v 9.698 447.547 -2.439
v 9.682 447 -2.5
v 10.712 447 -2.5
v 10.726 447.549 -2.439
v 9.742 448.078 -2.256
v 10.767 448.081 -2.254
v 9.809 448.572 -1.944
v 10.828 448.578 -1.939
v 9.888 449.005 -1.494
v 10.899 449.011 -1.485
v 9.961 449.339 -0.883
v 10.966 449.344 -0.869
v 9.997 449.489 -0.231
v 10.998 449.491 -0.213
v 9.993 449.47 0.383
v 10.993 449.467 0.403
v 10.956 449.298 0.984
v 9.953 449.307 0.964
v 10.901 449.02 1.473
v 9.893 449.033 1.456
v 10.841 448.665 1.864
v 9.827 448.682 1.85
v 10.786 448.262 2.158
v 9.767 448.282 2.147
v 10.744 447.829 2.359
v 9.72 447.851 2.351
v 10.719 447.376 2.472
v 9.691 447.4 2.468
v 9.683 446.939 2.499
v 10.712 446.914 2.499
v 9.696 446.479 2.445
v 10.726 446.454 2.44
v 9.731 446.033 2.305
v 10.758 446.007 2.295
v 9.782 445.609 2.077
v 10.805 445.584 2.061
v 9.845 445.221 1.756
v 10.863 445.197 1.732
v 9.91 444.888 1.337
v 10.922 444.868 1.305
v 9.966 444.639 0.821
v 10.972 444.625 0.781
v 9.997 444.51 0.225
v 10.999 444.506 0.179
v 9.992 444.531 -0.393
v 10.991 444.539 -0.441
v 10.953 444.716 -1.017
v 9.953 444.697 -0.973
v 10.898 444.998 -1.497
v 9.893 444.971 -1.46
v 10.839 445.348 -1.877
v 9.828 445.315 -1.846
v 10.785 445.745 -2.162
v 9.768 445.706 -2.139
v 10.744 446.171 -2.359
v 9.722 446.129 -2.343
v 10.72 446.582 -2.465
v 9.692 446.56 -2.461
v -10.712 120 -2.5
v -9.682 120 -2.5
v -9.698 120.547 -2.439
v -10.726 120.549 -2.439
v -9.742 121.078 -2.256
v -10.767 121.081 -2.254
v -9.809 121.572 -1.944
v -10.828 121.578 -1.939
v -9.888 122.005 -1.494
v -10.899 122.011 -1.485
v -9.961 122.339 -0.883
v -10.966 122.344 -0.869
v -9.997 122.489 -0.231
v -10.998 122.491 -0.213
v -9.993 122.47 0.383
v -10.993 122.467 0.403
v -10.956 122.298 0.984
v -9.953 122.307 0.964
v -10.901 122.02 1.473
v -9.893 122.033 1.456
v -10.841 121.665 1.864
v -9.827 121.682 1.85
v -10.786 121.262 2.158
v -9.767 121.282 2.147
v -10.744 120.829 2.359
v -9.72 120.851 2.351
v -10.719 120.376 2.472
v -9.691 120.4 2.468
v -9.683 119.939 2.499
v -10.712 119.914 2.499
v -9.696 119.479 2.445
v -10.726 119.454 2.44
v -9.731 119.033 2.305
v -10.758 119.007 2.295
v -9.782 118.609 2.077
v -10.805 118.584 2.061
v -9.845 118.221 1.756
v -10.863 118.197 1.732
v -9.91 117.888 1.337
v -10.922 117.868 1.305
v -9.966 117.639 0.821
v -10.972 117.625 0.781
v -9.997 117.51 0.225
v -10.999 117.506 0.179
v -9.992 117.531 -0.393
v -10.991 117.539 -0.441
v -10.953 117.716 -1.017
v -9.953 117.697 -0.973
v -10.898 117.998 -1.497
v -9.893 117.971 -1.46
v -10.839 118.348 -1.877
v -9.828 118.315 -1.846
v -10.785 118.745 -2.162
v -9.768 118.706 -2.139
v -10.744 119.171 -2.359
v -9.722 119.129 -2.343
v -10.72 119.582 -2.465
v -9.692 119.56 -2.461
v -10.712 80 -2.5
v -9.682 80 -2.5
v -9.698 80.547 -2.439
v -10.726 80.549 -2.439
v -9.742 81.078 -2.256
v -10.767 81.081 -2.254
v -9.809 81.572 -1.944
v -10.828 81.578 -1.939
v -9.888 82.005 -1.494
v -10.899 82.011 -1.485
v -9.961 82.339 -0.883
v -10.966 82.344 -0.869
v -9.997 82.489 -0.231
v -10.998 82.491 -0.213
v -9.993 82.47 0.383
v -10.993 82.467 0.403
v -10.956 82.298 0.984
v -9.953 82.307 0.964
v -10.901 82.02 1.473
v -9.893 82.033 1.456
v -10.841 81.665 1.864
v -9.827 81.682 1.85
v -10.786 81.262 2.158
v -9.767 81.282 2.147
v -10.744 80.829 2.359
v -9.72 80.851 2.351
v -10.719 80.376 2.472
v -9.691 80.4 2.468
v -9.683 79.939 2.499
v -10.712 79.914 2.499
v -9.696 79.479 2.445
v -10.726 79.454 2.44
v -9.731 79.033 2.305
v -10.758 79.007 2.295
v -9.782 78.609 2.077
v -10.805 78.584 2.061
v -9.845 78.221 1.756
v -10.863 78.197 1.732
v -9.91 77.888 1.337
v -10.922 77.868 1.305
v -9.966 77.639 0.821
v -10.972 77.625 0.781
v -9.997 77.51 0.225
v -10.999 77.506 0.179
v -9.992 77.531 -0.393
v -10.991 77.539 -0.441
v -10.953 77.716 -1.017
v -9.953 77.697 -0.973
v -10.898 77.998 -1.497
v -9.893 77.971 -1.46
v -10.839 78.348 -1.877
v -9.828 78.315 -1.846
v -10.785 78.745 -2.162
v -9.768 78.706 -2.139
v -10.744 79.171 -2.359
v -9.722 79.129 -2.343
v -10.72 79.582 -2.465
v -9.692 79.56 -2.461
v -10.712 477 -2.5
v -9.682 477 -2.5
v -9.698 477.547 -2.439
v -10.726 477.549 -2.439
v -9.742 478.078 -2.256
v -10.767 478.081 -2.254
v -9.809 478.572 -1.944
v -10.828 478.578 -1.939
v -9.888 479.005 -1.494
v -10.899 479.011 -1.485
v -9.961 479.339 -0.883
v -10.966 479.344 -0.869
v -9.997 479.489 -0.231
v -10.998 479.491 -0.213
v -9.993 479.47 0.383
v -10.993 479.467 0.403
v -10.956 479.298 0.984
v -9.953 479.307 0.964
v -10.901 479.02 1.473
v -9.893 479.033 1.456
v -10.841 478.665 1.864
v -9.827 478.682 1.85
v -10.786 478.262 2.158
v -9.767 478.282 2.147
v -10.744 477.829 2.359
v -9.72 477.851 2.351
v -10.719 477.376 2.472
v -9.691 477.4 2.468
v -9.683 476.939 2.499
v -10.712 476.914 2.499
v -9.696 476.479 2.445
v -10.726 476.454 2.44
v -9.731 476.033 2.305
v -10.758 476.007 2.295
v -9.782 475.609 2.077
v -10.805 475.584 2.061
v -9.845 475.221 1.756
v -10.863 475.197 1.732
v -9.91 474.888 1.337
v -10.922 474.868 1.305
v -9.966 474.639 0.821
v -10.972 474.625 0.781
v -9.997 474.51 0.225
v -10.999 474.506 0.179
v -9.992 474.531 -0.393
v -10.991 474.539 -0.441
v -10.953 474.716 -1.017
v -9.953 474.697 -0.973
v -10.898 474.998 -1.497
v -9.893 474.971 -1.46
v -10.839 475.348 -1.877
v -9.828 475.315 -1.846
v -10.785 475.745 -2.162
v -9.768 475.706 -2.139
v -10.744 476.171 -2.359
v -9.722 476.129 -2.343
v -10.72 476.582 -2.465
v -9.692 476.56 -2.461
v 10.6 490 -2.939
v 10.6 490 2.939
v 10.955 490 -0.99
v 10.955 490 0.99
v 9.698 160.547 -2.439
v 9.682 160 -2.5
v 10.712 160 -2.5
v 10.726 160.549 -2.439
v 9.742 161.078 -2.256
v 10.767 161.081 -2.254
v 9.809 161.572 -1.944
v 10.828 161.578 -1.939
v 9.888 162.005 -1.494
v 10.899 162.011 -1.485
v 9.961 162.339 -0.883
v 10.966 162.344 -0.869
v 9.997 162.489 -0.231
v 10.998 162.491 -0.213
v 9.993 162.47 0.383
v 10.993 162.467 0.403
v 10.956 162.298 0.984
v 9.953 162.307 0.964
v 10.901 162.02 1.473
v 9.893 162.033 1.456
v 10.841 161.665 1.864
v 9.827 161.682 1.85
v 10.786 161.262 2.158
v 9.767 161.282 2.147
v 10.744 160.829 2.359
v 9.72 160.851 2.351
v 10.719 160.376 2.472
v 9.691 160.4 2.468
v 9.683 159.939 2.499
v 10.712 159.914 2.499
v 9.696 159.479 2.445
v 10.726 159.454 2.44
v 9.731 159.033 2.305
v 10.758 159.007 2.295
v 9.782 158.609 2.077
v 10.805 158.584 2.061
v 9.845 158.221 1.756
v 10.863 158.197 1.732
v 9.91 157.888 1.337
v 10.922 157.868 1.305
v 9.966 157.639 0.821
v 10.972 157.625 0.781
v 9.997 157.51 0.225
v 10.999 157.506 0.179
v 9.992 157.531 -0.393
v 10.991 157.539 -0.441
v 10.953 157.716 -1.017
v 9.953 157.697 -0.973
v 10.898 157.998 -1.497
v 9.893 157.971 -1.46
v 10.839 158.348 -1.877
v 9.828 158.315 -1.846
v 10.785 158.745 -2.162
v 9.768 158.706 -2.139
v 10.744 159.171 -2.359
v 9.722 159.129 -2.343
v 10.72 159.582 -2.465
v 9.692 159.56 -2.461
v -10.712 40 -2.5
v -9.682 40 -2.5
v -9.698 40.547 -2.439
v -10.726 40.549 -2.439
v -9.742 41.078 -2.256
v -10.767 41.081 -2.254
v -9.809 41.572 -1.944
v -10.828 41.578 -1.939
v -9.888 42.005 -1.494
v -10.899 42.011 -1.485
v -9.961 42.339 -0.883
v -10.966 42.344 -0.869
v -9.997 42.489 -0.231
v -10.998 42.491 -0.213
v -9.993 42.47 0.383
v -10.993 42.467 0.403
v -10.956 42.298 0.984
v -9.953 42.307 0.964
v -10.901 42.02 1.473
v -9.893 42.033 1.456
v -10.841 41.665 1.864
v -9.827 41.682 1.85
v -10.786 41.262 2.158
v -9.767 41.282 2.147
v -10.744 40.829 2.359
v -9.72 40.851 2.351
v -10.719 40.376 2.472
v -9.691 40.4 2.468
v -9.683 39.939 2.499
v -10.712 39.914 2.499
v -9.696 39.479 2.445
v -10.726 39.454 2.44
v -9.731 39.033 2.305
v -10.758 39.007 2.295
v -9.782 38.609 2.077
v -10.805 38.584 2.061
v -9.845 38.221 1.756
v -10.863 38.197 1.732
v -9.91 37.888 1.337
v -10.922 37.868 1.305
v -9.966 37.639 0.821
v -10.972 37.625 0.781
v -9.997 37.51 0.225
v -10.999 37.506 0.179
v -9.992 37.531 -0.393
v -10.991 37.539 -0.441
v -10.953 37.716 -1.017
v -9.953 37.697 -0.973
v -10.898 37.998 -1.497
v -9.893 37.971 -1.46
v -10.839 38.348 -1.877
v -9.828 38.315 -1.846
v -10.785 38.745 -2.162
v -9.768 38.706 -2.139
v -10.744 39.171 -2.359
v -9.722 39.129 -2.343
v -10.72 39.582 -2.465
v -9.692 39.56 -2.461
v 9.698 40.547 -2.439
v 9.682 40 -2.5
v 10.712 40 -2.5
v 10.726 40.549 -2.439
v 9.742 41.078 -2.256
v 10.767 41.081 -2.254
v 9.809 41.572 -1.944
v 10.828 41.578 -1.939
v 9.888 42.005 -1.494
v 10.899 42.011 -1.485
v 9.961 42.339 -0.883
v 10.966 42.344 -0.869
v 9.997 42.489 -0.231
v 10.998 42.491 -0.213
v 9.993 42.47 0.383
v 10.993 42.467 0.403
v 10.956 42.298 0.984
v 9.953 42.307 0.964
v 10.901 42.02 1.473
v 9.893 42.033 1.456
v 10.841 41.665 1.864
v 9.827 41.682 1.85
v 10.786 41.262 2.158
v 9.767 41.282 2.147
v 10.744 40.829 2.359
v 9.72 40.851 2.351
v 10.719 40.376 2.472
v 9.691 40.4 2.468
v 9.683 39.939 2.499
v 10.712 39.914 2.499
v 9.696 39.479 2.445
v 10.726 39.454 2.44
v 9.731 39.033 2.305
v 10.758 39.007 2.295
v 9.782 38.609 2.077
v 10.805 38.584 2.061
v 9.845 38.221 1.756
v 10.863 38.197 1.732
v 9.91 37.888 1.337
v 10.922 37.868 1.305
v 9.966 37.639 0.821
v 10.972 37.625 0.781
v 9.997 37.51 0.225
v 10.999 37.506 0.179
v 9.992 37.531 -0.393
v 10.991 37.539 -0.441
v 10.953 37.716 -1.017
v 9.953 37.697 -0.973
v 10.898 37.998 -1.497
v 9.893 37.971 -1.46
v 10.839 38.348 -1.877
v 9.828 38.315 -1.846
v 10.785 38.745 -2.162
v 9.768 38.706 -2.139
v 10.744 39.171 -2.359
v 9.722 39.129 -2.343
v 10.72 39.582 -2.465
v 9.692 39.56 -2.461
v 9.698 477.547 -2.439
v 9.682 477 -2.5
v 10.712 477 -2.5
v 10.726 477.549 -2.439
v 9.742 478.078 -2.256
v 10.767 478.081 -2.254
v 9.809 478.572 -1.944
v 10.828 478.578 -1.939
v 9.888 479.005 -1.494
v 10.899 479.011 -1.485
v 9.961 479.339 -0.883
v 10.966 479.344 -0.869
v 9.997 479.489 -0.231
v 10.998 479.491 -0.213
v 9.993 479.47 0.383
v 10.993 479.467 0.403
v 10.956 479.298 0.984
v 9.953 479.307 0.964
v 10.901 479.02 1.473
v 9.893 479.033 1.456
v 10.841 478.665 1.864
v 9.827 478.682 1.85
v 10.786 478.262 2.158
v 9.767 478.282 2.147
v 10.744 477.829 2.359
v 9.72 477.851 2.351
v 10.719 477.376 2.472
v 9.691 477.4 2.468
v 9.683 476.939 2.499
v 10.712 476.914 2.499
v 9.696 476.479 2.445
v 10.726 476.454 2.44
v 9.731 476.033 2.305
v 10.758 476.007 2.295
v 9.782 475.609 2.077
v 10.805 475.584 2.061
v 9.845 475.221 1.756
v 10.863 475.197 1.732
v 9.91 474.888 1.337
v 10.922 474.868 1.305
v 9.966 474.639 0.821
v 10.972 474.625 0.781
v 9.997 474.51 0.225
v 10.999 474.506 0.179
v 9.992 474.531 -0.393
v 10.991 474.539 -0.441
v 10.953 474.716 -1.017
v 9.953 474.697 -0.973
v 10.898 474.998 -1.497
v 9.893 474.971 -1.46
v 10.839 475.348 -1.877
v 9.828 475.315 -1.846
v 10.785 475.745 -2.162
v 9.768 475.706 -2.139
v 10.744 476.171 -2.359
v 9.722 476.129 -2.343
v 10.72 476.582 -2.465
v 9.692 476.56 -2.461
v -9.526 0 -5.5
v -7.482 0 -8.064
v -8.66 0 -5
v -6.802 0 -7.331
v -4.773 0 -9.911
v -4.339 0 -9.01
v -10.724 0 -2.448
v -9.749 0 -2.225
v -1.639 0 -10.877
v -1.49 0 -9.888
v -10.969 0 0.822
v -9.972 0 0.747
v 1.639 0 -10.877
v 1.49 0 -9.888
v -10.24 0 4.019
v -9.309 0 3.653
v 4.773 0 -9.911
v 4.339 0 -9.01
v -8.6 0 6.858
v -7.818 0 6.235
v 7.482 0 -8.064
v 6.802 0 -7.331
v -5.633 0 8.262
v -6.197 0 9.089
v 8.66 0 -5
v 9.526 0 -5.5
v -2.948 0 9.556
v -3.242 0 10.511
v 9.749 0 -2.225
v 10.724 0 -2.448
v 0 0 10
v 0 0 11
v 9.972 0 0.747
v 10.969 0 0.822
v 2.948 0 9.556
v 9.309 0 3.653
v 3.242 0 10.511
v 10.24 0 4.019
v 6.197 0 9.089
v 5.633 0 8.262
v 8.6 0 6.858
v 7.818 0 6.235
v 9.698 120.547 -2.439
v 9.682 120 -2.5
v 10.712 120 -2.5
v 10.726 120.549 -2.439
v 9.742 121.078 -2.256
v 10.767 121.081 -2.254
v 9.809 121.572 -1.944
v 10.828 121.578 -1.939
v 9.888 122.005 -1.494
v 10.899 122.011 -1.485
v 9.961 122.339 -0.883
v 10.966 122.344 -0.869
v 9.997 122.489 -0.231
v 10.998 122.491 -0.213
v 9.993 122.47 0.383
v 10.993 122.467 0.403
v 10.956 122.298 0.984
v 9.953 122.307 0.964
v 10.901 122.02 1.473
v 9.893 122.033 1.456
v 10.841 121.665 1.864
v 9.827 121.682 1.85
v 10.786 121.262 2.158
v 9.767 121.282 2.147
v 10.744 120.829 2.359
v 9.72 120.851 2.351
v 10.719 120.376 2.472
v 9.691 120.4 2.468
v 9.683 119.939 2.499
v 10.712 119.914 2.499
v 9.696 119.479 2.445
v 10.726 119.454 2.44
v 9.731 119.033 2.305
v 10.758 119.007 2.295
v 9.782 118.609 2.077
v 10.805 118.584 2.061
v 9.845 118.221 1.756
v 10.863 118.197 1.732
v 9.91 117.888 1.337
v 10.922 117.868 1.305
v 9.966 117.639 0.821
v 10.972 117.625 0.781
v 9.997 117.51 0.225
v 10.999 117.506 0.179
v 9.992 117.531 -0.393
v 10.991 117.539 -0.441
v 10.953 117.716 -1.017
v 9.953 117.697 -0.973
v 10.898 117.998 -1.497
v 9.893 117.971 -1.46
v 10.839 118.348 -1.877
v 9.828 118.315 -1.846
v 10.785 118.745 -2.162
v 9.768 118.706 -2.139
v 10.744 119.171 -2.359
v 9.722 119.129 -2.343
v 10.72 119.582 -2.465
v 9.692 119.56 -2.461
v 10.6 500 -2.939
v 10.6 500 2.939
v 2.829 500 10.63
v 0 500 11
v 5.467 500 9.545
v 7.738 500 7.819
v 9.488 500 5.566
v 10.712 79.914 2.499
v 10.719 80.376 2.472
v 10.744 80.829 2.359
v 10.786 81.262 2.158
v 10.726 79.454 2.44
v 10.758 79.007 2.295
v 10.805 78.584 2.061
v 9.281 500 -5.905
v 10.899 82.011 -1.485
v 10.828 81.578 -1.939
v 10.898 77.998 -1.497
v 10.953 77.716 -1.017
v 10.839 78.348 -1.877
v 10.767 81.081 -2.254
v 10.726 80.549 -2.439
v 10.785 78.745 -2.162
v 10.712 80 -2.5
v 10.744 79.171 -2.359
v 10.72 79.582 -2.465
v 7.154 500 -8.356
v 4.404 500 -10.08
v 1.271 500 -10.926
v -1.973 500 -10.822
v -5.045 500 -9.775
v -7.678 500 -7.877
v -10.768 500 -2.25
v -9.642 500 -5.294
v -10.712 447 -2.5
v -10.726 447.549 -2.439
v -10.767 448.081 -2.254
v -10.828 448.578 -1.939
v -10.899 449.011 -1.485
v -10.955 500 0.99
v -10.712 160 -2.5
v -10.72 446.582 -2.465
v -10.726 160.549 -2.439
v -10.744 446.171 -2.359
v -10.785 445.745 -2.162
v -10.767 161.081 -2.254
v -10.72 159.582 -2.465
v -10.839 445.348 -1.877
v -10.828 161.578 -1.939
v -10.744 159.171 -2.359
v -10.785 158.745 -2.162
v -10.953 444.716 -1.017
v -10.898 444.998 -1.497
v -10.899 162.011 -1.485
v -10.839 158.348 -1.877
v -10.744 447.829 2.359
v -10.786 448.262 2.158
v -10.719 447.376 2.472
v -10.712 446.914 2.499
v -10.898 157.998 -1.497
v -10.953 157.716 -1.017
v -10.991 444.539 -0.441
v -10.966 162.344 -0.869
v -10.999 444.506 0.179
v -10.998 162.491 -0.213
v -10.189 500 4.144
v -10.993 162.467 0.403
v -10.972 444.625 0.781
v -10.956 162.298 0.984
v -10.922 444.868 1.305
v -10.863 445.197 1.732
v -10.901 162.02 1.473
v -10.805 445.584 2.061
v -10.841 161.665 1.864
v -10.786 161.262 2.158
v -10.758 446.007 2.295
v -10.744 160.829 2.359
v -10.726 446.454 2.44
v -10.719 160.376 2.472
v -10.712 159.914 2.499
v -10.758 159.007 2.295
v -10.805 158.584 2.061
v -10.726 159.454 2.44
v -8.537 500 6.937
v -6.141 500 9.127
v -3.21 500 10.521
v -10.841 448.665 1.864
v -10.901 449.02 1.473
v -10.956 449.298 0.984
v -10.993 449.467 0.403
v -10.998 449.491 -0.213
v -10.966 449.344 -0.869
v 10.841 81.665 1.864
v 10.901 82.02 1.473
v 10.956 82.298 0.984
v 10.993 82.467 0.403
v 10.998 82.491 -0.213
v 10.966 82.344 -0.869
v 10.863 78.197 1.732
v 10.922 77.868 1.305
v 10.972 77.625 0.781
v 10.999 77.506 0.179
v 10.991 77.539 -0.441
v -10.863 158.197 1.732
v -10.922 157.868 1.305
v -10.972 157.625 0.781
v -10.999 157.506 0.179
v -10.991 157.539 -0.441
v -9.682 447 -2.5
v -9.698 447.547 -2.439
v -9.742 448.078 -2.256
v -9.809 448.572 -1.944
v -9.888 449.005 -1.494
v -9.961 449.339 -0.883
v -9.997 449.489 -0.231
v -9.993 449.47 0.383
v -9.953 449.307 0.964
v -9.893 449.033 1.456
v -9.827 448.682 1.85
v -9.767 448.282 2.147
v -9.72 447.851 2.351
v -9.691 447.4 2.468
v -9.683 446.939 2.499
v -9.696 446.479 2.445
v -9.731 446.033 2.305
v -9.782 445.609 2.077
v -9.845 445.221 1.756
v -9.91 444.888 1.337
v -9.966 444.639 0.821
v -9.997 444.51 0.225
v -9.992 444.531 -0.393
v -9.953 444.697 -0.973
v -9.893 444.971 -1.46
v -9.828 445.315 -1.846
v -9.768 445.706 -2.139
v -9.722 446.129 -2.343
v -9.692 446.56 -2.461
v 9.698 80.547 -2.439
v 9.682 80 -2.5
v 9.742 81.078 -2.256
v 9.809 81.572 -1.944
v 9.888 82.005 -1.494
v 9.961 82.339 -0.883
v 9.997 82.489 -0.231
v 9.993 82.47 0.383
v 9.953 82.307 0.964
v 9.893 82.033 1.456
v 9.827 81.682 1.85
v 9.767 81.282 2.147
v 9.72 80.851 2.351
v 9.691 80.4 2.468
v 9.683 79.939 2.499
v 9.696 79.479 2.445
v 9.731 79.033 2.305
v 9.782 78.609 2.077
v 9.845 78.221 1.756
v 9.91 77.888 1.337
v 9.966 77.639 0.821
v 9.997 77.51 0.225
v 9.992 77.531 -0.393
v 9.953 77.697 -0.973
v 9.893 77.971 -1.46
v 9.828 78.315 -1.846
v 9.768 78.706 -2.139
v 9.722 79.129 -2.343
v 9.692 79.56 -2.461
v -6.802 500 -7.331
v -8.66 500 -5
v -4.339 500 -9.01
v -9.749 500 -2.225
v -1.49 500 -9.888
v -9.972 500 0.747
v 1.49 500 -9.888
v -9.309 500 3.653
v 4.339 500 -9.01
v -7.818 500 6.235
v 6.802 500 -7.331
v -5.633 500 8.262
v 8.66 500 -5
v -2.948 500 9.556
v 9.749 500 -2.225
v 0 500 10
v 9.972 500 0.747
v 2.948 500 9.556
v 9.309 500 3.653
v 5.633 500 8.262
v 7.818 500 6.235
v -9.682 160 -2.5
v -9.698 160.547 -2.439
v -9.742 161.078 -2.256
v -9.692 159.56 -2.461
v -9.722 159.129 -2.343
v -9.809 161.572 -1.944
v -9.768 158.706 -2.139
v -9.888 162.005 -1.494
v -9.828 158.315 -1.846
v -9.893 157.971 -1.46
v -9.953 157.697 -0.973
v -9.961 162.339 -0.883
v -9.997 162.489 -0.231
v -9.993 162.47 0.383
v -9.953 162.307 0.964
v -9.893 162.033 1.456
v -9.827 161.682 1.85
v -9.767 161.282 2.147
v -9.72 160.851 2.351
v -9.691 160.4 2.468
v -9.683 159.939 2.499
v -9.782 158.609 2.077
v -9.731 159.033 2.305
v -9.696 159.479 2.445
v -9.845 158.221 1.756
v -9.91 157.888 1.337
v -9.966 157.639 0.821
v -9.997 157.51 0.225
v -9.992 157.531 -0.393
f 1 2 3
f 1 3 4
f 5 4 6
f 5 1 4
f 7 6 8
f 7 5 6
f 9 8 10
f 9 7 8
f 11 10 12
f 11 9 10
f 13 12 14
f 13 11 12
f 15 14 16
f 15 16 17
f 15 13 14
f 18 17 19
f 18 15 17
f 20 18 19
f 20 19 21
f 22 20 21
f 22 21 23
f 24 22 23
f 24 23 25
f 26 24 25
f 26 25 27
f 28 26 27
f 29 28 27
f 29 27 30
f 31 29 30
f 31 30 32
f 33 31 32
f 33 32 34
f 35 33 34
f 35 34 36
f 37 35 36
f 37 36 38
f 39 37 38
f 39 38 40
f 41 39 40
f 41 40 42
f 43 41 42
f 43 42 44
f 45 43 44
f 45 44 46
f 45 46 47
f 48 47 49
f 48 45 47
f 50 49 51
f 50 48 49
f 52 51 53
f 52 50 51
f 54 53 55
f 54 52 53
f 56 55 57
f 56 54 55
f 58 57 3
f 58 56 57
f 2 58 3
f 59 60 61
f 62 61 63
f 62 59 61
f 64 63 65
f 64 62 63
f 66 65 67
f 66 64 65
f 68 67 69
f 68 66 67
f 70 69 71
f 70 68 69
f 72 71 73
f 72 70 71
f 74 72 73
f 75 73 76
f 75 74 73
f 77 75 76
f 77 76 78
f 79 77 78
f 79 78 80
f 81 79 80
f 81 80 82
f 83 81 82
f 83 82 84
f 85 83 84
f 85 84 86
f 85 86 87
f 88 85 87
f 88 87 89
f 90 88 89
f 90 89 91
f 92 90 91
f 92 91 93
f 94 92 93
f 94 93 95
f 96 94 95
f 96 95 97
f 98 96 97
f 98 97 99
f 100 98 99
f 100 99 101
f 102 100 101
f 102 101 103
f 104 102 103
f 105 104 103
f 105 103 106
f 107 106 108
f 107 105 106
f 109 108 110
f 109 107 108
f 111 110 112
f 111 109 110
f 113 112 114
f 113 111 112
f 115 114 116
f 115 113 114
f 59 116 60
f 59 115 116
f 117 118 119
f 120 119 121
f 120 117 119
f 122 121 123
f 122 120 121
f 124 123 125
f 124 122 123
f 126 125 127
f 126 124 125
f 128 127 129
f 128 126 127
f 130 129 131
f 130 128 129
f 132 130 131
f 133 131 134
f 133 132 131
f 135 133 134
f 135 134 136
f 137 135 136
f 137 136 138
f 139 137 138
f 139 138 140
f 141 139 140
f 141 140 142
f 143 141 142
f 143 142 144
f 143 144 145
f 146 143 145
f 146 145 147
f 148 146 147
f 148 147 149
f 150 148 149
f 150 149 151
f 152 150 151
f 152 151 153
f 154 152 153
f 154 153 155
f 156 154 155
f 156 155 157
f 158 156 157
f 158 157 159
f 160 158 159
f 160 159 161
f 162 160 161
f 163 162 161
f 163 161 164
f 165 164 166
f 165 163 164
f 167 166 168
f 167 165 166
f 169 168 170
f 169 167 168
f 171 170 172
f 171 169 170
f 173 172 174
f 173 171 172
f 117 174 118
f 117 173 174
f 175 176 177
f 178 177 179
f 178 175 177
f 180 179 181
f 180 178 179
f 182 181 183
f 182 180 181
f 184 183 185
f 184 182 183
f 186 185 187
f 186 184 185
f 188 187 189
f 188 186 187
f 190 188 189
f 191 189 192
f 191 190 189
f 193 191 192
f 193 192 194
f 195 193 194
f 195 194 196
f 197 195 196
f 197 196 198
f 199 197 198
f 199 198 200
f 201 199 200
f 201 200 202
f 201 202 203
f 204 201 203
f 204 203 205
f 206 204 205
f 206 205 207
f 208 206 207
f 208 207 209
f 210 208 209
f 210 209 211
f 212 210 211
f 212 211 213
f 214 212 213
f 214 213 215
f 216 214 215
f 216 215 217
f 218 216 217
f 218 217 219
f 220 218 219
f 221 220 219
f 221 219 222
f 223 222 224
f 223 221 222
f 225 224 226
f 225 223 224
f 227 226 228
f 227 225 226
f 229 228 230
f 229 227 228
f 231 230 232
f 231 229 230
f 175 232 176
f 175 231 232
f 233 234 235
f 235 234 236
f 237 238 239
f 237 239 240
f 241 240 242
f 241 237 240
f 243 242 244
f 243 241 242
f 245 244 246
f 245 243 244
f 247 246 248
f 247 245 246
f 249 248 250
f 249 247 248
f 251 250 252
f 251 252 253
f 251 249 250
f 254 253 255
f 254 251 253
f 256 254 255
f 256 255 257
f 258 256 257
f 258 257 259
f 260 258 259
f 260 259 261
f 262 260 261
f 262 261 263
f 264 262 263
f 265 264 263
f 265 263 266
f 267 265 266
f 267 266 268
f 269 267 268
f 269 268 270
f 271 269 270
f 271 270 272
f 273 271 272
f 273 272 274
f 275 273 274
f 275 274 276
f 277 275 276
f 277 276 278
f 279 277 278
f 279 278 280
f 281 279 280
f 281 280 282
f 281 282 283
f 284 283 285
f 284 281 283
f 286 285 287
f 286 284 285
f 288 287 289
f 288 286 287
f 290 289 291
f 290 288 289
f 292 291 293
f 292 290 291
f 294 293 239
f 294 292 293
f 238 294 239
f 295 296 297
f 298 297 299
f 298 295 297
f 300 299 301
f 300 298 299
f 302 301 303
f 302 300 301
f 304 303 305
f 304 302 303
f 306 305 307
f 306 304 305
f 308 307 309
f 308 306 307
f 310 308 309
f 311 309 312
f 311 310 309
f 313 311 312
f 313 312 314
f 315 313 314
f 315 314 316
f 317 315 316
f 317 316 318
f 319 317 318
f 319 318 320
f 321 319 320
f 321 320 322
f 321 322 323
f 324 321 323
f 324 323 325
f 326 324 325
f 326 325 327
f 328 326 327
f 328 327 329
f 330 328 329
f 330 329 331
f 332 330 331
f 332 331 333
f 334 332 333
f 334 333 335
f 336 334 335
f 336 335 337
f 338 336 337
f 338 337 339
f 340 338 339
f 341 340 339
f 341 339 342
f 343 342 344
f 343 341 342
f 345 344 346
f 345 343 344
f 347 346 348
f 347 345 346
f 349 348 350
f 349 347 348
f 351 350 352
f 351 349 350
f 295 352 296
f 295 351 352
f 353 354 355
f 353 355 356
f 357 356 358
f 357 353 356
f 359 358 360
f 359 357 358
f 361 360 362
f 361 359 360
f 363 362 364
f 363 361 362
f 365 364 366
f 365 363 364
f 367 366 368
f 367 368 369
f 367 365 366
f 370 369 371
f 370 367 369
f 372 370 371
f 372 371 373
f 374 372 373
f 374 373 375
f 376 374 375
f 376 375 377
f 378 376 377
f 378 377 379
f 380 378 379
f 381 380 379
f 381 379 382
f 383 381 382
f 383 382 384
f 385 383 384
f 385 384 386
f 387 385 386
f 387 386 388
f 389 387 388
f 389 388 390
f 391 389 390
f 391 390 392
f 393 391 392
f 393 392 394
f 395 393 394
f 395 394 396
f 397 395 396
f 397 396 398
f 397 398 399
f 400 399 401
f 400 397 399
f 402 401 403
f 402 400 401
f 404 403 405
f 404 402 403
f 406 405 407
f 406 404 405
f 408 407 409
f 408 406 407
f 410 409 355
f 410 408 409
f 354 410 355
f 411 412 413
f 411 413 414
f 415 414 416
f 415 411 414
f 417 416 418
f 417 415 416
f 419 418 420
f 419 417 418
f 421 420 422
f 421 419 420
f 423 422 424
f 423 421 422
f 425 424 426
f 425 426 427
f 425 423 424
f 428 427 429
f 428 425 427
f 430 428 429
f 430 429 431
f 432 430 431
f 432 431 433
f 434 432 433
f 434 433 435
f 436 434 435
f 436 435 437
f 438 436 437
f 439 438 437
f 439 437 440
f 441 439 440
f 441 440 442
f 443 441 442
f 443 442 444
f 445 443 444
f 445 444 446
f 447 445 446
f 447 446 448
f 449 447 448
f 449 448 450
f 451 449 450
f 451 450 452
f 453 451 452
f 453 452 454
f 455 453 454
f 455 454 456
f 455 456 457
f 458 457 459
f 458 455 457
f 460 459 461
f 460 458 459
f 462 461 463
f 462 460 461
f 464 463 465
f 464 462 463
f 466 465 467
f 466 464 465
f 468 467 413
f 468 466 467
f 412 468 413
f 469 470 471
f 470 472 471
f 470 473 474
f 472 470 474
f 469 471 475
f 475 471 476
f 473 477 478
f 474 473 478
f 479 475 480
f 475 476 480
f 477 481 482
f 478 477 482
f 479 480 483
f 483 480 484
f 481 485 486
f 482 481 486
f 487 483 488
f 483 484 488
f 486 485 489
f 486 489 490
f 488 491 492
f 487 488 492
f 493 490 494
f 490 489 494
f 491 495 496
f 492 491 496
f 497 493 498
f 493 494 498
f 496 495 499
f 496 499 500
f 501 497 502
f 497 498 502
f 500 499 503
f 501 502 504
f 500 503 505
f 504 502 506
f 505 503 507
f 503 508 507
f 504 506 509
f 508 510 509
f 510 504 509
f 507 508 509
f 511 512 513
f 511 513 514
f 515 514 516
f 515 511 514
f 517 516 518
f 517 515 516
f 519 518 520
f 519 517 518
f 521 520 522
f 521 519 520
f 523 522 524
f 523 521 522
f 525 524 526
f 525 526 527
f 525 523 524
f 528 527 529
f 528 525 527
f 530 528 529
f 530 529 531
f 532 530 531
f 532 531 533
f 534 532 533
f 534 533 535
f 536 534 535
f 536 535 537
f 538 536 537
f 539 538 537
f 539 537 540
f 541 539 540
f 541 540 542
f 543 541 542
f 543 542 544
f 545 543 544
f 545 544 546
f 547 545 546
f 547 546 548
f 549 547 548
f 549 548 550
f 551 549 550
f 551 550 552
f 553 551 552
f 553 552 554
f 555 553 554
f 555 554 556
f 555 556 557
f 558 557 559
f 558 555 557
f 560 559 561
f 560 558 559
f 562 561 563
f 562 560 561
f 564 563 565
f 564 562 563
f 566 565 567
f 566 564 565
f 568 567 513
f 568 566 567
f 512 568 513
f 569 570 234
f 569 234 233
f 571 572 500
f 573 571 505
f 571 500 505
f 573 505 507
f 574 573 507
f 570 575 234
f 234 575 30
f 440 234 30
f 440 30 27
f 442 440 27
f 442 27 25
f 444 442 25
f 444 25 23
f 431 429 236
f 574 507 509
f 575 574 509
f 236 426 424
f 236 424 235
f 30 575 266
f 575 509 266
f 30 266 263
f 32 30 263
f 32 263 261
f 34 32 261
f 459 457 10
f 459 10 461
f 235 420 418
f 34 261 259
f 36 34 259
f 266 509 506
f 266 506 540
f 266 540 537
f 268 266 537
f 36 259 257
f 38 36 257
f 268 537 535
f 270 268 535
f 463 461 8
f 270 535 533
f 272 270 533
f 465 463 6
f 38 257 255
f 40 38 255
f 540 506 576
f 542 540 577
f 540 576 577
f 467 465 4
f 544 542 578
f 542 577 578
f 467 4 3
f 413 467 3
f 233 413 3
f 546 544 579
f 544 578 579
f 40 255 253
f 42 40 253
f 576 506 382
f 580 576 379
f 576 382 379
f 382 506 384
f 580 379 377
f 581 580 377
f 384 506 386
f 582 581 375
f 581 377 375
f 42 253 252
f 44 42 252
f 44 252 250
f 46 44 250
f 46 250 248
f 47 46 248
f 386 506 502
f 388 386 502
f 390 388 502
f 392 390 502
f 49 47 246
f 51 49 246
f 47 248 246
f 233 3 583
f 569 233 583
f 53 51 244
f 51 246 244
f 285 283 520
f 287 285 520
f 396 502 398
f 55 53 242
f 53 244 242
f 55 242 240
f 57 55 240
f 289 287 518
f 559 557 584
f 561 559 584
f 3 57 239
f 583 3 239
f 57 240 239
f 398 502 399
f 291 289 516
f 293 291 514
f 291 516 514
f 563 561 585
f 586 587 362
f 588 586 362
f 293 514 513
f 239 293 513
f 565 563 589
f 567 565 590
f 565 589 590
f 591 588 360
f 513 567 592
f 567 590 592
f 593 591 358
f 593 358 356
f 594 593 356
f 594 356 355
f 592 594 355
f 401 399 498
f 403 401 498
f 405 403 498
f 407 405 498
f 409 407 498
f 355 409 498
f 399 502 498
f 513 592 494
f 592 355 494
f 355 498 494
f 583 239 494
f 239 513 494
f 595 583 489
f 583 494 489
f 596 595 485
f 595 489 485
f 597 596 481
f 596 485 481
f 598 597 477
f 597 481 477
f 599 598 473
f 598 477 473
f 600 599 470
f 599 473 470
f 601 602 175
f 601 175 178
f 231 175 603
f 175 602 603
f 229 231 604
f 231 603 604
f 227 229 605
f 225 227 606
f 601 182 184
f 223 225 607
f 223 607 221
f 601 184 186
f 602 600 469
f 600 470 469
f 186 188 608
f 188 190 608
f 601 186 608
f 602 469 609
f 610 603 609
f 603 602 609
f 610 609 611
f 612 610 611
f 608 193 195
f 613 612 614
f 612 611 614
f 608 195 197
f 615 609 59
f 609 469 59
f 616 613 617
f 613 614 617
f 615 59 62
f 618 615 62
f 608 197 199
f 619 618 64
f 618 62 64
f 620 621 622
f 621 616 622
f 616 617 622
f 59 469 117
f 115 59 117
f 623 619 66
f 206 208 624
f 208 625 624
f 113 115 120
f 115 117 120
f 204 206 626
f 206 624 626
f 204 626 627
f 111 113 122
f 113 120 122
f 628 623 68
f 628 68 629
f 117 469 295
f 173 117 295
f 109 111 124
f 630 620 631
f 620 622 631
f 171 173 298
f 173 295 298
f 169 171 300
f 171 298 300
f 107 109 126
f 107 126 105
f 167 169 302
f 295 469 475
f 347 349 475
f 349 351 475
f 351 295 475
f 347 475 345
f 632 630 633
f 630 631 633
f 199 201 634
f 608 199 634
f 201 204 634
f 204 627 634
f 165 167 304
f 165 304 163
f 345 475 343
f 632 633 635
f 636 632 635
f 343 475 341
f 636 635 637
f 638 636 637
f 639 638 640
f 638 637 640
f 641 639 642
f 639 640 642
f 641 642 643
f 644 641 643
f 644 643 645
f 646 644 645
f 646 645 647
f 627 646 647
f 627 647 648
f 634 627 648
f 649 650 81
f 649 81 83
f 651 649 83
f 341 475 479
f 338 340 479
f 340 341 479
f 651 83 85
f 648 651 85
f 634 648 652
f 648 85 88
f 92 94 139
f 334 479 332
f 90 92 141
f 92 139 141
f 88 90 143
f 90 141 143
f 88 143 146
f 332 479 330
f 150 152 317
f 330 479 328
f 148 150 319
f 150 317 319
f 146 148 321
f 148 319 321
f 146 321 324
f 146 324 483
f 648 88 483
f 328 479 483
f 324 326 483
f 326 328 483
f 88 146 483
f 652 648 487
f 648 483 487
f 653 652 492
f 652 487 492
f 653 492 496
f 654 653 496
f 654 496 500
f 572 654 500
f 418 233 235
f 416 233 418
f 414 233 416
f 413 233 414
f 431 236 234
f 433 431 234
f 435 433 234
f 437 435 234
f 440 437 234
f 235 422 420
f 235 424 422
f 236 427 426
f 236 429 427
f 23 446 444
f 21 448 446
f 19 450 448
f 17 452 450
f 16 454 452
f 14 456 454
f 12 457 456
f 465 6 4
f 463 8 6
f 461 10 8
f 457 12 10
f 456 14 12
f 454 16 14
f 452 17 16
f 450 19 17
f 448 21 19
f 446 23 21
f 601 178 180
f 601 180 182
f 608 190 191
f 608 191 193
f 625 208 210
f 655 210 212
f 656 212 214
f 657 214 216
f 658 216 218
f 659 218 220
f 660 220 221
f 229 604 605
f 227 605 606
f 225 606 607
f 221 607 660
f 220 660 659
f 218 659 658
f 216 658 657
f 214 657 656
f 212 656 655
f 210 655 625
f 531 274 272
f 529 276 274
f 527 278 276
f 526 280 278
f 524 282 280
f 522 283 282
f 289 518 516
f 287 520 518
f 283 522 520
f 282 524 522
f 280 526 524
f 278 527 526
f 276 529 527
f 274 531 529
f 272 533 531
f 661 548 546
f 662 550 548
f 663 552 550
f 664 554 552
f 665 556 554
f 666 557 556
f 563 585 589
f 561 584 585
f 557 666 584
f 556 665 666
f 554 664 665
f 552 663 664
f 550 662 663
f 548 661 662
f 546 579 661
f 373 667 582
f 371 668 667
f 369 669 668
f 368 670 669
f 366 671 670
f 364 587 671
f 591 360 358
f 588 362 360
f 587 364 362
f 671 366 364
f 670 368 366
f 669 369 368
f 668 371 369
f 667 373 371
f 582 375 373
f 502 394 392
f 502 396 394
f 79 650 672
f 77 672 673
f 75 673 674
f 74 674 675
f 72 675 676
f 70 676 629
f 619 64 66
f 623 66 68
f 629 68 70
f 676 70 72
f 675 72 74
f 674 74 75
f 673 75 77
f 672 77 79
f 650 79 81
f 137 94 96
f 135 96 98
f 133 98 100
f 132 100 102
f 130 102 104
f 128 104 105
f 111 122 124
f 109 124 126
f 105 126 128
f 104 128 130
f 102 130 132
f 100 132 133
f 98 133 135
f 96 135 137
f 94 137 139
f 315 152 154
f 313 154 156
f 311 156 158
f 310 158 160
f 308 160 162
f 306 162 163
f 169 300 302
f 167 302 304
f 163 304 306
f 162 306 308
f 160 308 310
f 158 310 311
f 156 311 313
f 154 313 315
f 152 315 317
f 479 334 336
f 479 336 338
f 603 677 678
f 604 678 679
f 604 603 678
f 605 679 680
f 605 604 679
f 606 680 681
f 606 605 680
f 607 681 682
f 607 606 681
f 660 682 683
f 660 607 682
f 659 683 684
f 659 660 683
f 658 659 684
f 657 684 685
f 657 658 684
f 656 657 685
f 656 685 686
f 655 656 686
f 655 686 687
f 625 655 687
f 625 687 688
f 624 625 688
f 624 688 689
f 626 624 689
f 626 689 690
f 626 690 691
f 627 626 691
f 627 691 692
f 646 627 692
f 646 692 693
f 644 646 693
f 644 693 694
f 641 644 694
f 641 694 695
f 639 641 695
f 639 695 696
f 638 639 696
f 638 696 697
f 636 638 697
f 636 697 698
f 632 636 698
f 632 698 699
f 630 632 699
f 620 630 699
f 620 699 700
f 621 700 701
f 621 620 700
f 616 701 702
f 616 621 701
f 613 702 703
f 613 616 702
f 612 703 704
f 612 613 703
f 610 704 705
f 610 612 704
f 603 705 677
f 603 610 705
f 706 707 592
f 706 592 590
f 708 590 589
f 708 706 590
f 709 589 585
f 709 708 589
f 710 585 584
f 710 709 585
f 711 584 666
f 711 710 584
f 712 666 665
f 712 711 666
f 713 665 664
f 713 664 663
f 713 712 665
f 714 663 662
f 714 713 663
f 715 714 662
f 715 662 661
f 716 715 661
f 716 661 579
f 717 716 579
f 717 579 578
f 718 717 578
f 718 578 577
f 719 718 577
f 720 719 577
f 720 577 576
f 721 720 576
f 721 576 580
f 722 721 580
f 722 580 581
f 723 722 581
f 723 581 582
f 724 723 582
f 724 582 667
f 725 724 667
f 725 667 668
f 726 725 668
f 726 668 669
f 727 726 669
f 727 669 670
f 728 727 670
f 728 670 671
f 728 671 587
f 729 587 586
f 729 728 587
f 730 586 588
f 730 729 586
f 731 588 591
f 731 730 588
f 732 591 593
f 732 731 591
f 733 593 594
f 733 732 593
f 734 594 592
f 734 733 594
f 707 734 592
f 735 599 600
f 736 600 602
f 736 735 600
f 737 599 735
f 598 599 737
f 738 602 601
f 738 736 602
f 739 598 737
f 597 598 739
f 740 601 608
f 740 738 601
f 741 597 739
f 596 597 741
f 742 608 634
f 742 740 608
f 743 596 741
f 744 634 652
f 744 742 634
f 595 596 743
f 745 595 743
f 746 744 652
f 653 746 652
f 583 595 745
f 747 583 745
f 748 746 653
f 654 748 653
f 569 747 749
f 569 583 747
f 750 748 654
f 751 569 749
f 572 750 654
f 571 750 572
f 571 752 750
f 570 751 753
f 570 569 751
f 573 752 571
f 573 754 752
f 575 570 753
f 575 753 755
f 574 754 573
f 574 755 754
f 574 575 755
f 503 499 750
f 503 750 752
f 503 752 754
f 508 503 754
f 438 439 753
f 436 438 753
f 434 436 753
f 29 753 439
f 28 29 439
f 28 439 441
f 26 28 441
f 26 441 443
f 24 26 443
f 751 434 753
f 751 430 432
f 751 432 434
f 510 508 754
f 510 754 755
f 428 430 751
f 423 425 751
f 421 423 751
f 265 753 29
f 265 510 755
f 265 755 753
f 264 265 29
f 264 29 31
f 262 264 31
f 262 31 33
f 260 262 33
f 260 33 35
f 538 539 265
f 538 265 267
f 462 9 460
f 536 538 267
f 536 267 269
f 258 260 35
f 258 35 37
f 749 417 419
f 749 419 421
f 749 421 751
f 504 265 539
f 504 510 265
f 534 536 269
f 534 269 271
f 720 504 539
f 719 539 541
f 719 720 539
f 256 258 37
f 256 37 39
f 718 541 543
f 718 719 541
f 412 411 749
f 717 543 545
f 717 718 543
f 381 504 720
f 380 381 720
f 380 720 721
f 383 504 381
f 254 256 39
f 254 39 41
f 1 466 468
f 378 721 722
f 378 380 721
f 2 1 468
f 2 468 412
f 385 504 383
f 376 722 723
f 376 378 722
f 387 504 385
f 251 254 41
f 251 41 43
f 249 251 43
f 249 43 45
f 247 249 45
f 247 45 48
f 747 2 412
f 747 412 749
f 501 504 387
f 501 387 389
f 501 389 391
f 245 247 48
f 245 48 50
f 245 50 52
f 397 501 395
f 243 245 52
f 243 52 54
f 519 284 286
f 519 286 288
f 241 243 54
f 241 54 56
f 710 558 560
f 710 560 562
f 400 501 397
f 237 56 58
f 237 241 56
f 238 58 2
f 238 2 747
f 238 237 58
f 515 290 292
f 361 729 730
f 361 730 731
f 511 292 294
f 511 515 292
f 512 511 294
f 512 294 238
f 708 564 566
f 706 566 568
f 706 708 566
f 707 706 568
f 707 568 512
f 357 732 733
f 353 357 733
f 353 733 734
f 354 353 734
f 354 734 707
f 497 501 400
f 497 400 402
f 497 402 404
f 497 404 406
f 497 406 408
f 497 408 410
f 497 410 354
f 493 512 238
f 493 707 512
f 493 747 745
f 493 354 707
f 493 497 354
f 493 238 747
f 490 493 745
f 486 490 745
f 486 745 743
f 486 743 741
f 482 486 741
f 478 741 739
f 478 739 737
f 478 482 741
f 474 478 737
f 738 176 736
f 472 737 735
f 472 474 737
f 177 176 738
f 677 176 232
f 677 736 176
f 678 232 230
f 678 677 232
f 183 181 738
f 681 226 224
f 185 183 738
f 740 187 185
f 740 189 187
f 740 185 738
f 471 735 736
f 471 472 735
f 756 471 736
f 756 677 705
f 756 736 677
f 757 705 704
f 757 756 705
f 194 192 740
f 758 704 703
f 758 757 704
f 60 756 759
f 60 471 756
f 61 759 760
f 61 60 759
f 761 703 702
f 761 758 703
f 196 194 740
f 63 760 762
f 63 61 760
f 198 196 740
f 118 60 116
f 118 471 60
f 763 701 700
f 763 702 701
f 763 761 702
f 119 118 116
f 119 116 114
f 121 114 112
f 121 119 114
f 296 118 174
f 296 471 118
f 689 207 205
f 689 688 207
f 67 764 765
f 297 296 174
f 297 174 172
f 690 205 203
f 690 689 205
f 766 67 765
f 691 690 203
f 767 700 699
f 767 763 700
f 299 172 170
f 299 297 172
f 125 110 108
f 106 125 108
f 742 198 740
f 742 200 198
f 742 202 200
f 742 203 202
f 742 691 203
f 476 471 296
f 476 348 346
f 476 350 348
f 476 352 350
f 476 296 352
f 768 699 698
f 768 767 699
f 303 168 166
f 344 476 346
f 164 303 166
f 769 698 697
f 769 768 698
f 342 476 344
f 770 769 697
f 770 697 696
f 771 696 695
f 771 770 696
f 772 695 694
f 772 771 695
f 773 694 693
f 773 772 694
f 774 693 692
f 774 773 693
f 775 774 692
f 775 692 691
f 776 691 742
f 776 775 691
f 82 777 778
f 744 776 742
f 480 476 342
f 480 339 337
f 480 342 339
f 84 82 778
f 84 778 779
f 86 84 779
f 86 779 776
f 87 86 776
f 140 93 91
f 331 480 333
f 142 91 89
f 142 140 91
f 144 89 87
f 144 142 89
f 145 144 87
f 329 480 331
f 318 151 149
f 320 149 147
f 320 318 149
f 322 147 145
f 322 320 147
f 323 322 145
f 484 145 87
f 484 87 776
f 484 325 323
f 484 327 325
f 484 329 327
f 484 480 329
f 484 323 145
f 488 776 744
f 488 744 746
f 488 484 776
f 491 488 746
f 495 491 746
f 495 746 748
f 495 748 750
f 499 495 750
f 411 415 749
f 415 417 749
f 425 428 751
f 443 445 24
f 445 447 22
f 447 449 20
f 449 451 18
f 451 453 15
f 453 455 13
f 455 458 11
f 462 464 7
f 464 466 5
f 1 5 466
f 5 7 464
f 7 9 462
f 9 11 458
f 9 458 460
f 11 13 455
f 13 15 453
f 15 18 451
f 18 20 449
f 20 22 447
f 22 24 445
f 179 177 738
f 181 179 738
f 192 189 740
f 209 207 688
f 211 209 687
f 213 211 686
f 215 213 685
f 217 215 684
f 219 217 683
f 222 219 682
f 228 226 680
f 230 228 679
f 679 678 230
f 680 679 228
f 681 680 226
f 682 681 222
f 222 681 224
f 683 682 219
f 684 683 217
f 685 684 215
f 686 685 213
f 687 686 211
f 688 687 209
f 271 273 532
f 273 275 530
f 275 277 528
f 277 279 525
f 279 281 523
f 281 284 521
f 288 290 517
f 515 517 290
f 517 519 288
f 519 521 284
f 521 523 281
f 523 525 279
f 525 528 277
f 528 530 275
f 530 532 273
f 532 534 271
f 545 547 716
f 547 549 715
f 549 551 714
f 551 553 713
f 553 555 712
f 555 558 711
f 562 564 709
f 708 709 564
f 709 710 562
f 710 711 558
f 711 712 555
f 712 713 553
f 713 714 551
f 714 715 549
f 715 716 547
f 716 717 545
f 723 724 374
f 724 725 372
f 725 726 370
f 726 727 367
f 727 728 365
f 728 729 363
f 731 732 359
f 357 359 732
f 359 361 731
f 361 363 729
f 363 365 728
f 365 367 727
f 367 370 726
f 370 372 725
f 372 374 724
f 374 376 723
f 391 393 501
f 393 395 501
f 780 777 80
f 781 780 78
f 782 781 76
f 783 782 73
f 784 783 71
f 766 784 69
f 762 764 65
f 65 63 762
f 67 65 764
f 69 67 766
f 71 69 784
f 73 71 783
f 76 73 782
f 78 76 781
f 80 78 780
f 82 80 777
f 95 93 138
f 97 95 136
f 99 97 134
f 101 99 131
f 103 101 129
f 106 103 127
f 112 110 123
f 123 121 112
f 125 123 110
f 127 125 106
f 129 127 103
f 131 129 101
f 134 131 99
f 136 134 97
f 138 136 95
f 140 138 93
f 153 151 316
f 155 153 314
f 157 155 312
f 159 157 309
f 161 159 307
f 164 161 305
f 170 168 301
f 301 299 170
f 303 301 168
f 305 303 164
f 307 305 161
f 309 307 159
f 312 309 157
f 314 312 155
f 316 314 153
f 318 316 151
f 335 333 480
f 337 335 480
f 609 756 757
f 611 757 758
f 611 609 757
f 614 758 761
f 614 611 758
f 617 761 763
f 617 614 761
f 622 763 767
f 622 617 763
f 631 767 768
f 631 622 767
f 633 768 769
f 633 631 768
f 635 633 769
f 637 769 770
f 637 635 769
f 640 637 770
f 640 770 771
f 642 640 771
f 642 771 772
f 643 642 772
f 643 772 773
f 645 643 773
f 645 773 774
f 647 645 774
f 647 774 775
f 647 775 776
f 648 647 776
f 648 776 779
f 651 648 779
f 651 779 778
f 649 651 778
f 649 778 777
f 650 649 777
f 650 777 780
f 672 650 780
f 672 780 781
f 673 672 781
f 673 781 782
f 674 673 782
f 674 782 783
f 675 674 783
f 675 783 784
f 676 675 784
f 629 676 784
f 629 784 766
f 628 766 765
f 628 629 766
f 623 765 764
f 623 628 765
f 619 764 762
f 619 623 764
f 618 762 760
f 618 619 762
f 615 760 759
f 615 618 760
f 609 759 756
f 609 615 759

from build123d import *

# Parameters (mm, degrees)
SKETCH1_R               = 11
SKETCH1_R_2             = 10
BOSS_EXTRUDE1_DEPTH     = 500
SKETCH2_W               = 0.79991629
SKETCH2_H               = 5.878473502
CUT_EXTRUDE1_DEPTH      = 10
CUT_EXTRUDE2_DEPTH      = 501.587216984
CUT_EXTRUDE2_DEPTH_BACK = 501.587216984
SKETCH3_R               = 2.5
CUT_EXTRUDE3_DEPTH      = 501.587217091
CUT_EXTRUDE3_DEPTH_BACK = 501.587217091
SKETCH5_R               = 2.5


with BuildPart() as part:
    # Sketch1 → Boss-Extrude1 (new body)
    with BuildSketch(Plane(origin=(0, 0, 0), x_dir=(1, 0, 0), z_dir=(0, 1, 0))):
        with Locations(Location((0, 0, 0), (0, 0, 270))):
            Circle(SKETCH1_R)
        with Locations(Location((0, 0, 0), (0, 0, 270))):
            Circle(SKETCH1_R_2, mode=Mode.SUBTRACT)
    extrude(amount=BOSS_EXTRUDE1_DEPTH)

    # Sketch2 → Cut-Extrude1 (cut)
    with BuildSketch(Plane(origin=(0, 500, 0), x_dir=(1, 0, 0), z_dir=(0, 1, 0))):
        with Locations((11, 0)):
            Rectangle(SKETCH2_W, SKETCH2_H)
    extrude(amount=-CUT_EXTRUDE1_DEPTH, mode=Mode.SUBTRACT)

    # Sketch3 → Cut-Extrude2 (cut, two sides: drawn at the far end of the back side and taken through both)
    with BuildSketch(Plane(origin=(10.600041855, 0, 0), x_dir=(0, 0, -1), z_dir=(1, 0, 0)).offset(-CUT_EXTRUDE2_DEPTH_BACK)):
        with Locations((0, 477)):
            Circle(SKETCH3_R)
        with Locations((0, 447)):
            Circle(SKETCH3_R)
    extrude(amount=CUT_EXTRUDE2_DEPTH + CUT_EXTRUDE2_DEPTH_BACK, mode=Mode.SUBTRACT)

    # Sketch5 → Cut-Extrude3 (cut, two sides: drawn at the far end of the back side and taken through both)
    with BuildSketch(Plane(origin=(10.600041855, 0, 0), x_dir=(0, 0, -1), z_dir=(1, 0, 0)).offset(-CUT_EXTRUDE3_DEPTH_BACK)):
        with Locations((0, 40)):
            Circle(SKETCH5_R)
        with Locations((0, 80)):
            Circle(SKETCH5_R)
        with Locations((0, 120)):
            Circle(SKETCH5_R)
        with Locations((0, 160)):
            Circle(SKETCH5_R)
    extrude(amount=CUT_EXTRUDE3_DEPTH + CUT_EXTRUDE3_DEPTH_BACK, mode=Mode.SUBTRACT)


solid = part.part
